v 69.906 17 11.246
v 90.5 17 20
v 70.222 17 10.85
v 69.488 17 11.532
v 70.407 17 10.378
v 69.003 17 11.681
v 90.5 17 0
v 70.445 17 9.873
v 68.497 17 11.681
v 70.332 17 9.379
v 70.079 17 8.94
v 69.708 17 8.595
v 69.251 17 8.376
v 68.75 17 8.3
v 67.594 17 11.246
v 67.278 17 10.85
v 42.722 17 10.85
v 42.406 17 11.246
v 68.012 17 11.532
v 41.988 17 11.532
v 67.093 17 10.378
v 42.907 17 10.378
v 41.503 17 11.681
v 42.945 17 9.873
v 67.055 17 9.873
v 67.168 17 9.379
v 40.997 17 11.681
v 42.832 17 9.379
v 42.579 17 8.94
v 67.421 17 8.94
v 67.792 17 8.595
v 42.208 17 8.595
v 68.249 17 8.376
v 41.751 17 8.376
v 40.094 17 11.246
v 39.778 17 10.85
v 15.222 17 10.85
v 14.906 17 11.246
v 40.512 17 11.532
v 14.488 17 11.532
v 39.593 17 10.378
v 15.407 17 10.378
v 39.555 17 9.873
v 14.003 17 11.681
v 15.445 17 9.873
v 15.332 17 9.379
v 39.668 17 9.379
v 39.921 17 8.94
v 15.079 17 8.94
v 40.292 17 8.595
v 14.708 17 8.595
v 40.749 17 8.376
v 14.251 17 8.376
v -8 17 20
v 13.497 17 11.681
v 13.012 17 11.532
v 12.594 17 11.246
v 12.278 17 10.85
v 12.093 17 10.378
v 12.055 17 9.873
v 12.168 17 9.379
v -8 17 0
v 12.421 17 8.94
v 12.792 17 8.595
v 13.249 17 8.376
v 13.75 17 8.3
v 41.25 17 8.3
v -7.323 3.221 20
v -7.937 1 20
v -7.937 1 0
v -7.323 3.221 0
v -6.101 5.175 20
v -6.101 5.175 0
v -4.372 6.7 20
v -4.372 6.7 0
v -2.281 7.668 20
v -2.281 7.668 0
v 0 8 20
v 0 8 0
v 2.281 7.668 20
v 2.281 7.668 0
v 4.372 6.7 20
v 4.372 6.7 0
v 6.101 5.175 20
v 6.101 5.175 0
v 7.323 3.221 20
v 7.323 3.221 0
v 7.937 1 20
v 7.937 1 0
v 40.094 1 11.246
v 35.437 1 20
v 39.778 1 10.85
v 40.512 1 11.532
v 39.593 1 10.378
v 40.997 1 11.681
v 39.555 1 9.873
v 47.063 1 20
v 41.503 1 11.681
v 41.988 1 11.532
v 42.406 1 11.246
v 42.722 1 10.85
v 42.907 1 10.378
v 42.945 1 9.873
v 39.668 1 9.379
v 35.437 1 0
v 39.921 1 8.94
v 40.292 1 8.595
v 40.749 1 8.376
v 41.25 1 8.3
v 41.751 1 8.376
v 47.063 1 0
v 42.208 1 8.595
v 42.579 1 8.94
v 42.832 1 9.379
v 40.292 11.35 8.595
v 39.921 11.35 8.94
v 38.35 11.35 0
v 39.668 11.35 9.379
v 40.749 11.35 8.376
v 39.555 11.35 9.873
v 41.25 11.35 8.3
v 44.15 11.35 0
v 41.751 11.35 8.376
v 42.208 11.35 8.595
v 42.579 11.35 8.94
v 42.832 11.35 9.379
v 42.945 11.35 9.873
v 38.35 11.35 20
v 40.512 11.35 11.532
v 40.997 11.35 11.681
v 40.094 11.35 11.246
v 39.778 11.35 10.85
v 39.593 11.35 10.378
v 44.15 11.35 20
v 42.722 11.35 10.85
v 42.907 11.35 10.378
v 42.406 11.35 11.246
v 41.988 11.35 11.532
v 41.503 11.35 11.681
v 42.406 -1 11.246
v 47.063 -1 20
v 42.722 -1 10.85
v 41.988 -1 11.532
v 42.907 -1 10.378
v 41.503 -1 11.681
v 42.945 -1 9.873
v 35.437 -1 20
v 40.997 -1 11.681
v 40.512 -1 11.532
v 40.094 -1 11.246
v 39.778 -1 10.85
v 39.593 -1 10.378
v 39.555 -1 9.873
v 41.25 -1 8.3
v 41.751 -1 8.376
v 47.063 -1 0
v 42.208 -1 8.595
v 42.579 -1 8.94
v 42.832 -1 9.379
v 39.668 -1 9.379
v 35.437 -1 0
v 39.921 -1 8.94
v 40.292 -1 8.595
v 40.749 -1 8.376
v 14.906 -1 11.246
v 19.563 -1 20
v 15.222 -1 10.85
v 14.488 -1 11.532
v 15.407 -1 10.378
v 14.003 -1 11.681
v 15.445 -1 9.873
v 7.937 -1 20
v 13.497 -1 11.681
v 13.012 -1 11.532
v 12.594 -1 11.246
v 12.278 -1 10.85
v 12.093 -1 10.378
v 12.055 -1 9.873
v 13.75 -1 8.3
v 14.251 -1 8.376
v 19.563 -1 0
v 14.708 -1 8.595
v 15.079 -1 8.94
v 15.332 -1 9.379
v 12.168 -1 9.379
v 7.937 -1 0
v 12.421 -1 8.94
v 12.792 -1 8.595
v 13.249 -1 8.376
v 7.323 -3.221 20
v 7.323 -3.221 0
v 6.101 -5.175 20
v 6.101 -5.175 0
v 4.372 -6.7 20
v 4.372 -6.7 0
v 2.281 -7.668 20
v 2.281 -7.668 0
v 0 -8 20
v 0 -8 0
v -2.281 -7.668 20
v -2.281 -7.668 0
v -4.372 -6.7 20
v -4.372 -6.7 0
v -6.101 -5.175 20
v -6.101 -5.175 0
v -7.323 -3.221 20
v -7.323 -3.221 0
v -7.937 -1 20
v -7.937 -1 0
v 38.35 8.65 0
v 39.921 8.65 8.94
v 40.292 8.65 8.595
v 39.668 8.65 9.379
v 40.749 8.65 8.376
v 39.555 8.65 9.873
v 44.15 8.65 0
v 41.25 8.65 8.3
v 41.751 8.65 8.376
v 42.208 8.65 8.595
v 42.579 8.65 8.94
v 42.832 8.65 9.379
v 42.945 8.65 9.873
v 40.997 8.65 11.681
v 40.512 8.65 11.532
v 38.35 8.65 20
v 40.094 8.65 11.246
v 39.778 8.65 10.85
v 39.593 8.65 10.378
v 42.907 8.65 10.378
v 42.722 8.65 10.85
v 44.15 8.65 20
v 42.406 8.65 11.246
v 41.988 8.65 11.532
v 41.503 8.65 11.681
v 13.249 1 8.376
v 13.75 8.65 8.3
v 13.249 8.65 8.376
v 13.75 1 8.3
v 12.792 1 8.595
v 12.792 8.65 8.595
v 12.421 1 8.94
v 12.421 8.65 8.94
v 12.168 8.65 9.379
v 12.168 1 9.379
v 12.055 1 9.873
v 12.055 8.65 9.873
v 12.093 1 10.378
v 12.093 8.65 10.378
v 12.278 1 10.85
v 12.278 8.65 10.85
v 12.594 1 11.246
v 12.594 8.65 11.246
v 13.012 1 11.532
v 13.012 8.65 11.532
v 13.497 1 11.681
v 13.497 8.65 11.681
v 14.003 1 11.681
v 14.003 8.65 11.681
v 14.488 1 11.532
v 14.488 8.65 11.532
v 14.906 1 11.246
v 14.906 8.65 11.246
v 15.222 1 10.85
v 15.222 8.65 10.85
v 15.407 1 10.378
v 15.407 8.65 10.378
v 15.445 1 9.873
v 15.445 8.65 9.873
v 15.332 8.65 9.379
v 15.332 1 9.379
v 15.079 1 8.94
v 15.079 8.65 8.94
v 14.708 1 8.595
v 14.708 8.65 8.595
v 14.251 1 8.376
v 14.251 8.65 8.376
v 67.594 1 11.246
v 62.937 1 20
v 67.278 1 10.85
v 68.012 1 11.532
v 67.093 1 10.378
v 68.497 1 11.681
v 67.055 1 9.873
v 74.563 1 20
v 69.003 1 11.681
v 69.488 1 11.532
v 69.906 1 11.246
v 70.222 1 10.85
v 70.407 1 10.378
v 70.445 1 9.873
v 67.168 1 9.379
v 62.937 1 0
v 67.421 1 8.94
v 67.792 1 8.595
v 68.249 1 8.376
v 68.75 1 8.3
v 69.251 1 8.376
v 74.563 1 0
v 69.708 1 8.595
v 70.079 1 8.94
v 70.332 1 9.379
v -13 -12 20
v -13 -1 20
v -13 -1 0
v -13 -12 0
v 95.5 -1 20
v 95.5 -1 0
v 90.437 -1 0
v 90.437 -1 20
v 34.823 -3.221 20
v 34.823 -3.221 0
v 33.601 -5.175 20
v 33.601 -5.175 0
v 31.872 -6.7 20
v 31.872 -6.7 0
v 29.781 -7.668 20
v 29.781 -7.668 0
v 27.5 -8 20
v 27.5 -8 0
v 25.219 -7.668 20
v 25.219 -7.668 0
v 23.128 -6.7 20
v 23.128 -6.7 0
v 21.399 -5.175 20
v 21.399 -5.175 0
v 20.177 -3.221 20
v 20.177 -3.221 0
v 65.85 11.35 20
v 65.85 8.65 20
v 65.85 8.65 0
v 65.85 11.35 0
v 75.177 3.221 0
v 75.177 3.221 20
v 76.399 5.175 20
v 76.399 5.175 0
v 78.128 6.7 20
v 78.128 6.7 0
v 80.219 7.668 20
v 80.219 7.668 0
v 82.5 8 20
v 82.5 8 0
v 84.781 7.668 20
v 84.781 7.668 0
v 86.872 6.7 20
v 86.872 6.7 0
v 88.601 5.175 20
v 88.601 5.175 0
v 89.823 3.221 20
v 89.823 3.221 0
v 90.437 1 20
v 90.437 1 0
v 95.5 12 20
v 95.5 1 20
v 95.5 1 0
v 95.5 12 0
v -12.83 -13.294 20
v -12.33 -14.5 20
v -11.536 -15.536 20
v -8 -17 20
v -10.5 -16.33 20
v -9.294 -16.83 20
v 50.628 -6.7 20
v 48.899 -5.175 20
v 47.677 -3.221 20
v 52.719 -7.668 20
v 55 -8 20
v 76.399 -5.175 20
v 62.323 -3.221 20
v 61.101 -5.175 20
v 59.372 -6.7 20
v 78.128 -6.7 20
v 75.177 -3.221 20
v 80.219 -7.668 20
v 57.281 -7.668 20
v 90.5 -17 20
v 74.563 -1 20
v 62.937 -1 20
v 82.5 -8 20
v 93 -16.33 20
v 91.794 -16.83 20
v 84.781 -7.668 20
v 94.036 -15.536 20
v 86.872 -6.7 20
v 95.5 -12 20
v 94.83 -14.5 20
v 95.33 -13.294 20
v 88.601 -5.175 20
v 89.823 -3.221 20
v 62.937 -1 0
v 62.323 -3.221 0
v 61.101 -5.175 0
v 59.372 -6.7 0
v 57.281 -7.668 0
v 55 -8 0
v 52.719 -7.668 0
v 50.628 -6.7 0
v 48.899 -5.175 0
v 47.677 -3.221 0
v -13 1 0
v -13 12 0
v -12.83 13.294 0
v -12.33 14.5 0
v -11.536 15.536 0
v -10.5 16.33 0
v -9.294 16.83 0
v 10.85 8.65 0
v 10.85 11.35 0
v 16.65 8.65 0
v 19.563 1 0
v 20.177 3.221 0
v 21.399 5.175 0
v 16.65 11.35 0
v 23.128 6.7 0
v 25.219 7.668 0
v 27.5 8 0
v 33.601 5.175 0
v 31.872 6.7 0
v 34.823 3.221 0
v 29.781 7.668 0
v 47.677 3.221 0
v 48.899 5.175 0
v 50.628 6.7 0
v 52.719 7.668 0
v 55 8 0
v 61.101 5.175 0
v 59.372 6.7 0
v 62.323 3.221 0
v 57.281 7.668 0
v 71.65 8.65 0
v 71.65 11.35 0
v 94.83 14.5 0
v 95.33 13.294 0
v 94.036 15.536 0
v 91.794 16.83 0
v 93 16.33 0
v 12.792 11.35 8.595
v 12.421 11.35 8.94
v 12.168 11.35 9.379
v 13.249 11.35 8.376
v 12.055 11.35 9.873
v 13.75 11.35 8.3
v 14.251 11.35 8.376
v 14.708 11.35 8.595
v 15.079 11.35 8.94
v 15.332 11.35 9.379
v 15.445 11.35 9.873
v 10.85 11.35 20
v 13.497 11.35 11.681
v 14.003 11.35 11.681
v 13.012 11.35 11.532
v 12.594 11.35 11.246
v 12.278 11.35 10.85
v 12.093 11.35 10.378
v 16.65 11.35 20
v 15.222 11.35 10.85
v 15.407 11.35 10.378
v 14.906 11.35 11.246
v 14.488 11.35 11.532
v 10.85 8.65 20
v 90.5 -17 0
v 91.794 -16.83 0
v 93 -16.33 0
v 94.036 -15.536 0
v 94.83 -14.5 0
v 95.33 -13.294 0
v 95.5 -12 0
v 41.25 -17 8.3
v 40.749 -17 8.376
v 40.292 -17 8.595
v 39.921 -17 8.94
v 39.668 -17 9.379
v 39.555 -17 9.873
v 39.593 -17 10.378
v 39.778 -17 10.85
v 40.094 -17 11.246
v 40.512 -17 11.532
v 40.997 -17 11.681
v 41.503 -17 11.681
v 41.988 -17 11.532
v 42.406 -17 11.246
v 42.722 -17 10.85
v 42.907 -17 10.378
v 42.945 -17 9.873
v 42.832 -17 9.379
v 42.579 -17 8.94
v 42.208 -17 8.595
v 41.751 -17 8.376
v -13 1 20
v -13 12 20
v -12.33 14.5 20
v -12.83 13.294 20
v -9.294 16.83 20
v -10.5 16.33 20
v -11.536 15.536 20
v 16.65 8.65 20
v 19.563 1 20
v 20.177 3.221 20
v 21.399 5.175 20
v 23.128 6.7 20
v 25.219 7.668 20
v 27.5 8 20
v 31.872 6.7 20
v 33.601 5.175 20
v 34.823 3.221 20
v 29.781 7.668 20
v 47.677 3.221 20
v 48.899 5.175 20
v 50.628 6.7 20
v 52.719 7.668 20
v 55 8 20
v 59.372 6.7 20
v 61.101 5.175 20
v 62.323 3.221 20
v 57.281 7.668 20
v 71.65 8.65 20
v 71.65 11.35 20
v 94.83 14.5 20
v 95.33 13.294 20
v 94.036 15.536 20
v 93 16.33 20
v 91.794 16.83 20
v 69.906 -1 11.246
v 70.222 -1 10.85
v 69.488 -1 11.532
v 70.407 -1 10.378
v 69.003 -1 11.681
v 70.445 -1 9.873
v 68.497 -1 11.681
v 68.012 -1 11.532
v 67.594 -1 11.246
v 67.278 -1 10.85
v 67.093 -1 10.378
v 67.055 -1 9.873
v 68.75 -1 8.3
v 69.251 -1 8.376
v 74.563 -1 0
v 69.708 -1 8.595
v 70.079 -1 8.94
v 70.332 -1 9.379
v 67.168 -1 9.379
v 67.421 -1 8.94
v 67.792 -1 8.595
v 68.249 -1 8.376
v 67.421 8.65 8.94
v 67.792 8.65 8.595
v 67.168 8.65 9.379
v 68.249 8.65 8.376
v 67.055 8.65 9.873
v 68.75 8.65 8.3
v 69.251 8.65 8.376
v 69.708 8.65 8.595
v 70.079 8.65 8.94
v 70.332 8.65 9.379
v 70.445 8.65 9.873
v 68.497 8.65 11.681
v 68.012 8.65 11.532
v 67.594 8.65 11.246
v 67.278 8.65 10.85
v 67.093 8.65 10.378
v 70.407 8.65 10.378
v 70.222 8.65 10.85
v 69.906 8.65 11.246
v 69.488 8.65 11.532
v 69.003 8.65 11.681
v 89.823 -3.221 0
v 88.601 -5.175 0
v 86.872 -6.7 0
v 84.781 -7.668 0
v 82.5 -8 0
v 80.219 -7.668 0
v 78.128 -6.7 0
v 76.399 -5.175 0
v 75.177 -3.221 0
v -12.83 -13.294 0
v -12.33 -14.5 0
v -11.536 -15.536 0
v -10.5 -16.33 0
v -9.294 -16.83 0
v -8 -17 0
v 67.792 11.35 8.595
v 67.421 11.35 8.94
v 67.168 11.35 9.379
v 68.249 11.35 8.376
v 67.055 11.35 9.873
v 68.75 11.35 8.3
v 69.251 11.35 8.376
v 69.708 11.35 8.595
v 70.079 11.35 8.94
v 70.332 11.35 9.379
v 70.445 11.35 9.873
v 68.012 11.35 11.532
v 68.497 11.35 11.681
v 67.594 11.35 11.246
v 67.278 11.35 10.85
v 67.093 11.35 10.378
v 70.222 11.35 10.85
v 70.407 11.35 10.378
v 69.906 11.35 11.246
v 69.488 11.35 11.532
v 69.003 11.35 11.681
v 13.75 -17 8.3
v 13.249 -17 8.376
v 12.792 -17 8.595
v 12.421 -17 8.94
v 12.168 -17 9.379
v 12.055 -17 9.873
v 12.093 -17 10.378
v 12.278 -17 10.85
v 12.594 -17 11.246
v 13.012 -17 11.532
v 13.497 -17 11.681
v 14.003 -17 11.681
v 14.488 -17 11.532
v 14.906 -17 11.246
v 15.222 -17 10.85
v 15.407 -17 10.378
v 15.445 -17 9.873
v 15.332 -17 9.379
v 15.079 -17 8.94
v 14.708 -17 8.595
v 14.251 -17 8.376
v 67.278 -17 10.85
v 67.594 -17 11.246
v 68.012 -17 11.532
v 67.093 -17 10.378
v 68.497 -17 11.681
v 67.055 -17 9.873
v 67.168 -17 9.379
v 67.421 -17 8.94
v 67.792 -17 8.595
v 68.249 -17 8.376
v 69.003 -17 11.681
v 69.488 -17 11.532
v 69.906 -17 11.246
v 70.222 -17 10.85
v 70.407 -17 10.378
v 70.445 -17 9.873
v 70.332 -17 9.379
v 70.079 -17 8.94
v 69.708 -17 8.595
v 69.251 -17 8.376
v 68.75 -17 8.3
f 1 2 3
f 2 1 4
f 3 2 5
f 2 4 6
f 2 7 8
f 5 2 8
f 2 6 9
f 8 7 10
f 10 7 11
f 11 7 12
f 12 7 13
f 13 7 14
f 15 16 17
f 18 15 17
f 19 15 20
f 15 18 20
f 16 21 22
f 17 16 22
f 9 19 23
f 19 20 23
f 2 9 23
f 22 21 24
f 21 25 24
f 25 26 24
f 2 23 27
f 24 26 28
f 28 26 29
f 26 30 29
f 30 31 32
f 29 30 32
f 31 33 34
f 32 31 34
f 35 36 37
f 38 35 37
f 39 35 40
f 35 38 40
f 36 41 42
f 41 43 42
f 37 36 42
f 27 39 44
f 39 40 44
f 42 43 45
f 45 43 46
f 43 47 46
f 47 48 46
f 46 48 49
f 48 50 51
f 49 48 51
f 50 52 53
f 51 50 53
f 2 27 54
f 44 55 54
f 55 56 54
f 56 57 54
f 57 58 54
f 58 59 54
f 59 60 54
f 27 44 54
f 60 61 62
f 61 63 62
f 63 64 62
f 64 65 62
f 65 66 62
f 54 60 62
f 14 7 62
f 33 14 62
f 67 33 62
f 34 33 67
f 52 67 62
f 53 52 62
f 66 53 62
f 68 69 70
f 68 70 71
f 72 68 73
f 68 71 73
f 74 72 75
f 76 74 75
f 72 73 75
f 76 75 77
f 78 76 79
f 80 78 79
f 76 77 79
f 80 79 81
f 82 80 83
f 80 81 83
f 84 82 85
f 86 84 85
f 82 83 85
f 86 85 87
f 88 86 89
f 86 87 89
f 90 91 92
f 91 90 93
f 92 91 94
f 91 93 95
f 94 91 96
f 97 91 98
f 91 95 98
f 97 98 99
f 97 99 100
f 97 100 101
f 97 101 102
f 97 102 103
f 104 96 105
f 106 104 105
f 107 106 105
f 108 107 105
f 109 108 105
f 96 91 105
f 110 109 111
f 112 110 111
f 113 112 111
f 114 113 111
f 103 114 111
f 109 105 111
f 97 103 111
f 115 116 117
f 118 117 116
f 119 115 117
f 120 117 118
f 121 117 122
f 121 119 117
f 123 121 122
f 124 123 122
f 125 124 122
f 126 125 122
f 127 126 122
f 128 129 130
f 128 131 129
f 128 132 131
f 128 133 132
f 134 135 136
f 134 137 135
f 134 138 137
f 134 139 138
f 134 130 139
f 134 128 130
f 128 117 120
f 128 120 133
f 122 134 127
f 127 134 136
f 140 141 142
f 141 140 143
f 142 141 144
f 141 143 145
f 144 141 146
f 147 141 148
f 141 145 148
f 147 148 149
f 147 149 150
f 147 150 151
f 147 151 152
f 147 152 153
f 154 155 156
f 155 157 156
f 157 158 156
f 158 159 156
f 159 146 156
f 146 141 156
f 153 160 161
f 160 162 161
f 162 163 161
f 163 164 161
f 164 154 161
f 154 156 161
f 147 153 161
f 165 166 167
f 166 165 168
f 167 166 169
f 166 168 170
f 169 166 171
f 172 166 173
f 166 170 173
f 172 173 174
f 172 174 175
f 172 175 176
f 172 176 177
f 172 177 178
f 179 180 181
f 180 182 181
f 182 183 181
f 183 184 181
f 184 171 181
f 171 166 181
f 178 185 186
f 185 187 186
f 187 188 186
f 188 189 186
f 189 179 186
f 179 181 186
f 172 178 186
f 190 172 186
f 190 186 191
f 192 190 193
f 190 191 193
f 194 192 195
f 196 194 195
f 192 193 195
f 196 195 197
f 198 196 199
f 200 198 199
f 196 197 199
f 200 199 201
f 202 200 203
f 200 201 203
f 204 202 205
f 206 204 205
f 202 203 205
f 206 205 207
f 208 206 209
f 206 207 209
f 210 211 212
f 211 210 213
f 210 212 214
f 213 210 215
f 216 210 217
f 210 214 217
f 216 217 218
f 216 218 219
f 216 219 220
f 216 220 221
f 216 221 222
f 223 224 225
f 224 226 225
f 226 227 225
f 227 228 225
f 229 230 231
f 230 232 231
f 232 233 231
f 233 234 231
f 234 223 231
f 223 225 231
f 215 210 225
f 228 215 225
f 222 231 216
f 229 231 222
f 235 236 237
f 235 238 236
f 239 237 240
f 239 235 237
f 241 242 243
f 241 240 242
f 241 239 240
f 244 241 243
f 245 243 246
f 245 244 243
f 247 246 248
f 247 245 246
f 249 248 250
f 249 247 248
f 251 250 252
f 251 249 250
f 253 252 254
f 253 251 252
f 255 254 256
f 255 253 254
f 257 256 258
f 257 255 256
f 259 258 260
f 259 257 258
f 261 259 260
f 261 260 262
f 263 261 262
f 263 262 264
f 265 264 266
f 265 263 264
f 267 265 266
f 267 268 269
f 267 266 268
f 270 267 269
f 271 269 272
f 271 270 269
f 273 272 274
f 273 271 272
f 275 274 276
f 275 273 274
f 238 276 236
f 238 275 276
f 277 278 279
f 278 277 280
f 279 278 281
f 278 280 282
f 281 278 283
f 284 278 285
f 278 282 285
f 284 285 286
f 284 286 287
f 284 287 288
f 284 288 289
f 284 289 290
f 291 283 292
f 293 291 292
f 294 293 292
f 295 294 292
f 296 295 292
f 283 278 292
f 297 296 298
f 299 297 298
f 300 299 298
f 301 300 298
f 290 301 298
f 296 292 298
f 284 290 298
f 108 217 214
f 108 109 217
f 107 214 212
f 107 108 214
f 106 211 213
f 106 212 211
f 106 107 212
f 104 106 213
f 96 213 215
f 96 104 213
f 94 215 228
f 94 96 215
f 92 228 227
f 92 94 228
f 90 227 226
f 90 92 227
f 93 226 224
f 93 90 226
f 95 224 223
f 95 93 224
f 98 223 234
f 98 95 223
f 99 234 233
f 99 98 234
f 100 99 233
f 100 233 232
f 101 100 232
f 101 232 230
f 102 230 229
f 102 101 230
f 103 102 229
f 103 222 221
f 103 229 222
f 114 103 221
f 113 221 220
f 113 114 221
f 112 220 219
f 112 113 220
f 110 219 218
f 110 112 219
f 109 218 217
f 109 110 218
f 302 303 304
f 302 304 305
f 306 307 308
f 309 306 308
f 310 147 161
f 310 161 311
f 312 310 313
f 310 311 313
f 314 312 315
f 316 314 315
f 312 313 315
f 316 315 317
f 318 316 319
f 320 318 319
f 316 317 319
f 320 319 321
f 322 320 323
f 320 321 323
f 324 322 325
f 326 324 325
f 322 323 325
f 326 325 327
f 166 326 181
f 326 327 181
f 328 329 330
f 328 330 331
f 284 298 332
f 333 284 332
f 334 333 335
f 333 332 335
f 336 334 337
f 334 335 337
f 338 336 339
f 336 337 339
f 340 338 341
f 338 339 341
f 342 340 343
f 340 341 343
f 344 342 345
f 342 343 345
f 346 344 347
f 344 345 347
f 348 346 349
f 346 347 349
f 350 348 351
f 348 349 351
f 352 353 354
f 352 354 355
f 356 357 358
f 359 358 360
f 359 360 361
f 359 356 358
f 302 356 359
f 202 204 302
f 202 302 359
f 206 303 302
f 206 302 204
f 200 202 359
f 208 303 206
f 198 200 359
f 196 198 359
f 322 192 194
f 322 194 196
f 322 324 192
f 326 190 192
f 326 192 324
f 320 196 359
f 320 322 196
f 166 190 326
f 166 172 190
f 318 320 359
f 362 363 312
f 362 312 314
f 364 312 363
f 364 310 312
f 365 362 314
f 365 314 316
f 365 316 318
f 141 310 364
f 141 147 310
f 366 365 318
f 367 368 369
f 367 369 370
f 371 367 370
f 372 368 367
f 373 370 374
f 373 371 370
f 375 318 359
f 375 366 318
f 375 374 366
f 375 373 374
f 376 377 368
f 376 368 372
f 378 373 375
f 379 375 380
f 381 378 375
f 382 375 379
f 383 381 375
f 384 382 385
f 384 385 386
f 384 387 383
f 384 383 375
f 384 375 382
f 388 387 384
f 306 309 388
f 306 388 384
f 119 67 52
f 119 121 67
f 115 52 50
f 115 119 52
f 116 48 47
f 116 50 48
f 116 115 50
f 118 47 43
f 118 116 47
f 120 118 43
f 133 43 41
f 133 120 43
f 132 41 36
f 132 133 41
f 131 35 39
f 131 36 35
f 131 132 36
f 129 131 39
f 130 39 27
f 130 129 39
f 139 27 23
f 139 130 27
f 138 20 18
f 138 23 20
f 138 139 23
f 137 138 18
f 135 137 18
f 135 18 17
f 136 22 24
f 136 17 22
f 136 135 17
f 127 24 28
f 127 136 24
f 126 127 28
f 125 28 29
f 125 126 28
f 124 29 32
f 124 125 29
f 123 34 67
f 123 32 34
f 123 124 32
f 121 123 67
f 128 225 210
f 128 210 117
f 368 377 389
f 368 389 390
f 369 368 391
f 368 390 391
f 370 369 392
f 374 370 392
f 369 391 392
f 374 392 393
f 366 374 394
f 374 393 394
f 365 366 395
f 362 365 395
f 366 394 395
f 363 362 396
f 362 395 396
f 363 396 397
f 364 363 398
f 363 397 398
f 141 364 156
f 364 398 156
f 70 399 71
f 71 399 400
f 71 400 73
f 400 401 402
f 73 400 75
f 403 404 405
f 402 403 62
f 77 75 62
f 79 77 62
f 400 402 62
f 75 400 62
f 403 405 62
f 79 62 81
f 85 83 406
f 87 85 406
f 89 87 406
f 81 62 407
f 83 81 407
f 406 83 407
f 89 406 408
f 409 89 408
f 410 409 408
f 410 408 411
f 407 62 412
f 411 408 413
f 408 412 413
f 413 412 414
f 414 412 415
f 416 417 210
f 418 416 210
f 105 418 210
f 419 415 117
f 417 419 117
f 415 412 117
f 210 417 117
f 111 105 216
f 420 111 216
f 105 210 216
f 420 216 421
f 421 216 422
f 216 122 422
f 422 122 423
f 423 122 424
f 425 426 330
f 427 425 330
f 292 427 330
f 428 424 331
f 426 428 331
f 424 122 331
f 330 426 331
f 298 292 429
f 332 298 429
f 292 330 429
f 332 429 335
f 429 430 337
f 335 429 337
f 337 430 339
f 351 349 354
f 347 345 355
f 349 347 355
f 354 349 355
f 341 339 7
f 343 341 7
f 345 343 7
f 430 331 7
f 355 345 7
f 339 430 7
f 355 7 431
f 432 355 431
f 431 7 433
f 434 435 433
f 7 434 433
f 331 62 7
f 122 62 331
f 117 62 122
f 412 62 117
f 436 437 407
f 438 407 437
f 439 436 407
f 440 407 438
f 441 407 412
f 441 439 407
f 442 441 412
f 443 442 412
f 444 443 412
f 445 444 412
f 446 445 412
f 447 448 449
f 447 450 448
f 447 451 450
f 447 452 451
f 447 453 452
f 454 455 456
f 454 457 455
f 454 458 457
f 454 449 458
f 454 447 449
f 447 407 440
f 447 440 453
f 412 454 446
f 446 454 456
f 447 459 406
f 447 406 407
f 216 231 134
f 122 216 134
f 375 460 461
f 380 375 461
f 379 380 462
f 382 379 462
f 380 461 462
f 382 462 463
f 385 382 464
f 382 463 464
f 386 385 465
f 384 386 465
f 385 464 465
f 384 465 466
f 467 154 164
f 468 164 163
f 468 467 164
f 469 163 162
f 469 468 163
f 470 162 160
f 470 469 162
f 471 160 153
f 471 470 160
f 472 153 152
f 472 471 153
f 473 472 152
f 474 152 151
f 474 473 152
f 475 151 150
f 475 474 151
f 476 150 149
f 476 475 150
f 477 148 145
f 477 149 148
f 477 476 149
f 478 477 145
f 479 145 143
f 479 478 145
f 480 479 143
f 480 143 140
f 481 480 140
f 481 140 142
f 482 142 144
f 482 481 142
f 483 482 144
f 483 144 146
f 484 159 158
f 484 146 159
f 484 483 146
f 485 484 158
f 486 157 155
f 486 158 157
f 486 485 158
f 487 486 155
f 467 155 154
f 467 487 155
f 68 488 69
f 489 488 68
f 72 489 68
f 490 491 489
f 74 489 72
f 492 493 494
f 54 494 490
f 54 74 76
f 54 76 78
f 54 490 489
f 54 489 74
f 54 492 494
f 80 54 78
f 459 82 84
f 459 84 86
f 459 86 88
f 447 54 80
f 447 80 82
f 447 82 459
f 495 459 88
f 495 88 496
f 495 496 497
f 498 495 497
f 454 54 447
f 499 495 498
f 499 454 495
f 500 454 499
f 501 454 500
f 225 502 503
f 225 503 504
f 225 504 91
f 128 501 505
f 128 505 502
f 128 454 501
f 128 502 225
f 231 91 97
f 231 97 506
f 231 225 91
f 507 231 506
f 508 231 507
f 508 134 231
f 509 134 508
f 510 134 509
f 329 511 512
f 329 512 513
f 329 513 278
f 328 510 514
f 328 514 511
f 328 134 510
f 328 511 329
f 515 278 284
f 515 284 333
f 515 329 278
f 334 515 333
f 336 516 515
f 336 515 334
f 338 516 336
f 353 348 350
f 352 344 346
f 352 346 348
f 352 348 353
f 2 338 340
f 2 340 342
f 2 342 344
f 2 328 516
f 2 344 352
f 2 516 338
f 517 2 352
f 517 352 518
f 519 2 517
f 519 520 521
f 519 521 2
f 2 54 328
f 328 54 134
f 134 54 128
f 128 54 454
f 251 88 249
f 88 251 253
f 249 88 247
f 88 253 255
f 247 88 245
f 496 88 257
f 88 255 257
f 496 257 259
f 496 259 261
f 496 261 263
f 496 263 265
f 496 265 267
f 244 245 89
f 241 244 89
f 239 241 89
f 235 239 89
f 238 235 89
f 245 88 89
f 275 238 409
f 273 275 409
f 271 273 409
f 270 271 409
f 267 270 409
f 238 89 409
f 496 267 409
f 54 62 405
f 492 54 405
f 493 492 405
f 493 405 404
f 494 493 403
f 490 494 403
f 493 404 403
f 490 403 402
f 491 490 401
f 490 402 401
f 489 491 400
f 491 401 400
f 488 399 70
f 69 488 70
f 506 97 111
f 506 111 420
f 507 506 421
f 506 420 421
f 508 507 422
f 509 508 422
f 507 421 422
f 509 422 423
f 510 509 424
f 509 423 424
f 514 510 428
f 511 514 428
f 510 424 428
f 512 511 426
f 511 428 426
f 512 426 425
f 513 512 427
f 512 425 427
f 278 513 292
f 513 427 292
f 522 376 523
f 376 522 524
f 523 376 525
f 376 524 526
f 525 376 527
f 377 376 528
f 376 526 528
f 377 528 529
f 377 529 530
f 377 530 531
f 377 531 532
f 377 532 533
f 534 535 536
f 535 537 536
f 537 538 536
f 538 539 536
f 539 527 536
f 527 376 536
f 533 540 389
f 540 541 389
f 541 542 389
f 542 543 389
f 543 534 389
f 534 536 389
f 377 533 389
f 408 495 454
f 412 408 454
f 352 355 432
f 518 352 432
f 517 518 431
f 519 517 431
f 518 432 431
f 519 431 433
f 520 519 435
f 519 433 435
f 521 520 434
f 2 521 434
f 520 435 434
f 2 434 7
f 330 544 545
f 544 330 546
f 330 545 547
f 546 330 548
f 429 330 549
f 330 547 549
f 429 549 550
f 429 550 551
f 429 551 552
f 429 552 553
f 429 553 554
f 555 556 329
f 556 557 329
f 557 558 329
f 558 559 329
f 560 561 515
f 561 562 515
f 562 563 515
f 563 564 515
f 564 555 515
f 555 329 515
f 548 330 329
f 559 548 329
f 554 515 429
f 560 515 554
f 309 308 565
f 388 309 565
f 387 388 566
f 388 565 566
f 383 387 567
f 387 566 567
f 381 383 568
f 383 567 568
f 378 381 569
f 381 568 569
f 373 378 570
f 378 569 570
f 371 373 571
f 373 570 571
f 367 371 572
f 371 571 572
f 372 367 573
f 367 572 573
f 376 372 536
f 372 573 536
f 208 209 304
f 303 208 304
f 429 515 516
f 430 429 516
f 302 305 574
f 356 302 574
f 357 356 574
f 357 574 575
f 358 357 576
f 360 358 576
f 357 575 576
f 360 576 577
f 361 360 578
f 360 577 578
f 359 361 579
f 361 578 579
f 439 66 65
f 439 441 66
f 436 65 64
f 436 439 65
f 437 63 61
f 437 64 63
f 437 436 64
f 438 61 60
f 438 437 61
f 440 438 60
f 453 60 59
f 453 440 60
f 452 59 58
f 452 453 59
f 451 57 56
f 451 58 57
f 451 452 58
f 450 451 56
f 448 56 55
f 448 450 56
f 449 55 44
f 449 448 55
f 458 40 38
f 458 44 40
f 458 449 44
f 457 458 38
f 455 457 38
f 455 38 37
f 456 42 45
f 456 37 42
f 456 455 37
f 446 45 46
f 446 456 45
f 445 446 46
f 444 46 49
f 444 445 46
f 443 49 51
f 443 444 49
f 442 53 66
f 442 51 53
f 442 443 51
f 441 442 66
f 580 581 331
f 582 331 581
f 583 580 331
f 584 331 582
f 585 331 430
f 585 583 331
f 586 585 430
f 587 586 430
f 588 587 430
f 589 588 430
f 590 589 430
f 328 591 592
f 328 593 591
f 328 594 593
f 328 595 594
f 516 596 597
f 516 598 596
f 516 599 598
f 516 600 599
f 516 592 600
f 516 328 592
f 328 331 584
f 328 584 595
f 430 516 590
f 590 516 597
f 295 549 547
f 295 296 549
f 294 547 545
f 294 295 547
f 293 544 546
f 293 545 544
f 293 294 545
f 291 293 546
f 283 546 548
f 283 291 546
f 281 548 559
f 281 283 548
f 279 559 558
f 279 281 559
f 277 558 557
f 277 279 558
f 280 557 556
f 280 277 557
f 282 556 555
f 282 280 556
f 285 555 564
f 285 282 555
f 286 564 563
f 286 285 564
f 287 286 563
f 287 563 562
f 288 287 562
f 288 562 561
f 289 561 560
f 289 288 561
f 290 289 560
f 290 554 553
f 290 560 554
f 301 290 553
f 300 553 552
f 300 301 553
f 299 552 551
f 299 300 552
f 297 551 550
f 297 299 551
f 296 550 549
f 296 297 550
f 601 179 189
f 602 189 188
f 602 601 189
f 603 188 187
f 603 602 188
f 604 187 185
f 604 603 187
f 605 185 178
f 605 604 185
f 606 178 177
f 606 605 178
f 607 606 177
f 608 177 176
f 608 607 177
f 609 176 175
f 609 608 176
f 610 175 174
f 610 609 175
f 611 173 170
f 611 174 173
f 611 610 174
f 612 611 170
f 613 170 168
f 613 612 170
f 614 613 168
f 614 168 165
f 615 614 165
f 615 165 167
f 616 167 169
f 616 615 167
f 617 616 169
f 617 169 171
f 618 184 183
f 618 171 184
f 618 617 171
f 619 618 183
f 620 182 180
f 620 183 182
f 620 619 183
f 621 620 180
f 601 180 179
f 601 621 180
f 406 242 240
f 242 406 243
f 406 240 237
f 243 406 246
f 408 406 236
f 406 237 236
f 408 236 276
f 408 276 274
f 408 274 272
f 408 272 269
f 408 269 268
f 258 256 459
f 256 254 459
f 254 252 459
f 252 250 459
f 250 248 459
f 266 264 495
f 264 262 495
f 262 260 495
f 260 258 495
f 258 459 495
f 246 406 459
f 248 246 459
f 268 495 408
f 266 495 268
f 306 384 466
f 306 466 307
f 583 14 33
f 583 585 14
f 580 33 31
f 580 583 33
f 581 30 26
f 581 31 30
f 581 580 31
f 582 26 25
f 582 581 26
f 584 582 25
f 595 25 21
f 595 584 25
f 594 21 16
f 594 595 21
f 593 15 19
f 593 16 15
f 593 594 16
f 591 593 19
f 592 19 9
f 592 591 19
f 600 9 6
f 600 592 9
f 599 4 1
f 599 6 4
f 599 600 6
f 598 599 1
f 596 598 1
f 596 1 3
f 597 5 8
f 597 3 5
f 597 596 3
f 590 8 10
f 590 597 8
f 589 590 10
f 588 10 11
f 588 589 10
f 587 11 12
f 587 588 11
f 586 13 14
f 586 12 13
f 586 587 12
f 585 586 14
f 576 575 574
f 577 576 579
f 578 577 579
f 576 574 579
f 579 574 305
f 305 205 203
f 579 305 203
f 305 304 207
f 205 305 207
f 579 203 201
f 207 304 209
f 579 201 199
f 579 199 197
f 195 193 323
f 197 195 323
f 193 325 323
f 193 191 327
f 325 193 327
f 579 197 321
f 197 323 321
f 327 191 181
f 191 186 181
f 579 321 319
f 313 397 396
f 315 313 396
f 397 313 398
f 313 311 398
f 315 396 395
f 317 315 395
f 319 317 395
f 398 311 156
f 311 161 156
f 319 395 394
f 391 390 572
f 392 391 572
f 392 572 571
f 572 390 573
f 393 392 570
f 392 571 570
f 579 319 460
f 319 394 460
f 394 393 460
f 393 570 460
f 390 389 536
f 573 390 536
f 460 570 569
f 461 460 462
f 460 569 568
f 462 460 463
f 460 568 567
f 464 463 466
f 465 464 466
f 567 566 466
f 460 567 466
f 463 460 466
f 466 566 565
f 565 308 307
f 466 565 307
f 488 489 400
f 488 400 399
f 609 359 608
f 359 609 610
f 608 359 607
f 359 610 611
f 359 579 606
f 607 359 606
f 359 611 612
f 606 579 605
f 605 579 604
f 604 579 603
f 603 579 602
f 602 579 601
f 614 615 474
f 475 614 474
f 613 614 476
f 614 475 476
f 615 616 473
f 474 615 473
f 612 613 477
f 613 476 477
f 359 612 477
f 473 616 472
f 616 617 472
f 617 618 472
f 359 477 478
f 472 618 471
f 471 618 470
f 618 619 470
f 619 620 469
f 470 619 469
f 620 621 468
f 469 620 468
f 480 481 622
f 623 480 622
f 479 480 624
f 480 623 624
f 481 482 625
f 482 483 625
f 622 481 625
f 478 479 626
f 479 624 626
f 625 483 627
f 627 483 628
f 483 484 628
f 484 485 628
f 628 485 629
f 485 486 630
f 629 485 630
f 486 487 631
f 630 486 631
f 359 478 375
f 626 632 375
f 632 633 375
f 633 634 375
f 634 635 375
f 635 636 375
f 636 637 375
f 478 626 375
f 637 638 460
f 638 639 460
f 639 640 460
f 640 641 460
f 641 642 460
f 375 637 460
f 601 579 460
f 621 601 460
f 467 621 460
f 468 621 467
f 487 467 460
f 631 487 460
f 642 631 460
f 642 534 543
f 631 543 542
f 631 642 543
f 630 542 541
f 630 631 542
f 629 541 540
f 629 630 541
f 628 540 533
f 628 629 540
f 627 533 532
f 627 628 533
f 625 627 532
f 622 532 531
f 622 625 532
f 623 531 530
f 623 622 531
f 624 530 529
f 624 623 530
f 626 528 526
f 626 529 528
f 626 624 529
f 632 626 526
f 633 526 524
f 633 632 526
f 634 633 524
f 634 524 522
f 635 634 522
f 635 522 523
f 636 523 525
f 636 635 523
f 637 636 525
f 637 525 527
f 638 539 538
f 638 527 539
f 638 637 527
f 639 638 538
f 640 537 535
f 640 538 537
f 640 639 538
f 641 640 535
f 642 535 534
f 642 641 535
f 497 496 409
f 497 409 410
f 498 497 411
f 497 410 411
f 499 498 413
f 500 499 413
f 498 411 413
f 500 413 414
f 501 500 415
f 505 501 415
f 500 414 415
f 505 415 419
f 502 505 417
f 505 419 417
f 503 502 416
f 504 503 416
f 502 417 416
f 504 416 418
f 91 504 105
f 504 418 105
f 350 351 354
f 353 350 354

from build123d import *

# Parameters (mm, degrees)
ESTRUSIONE_ESTRUSIONE1_DEPTH   = 20
ESTRUSIONE_ESTRUSIONE1_2_DEPTH = 20
SCHIZZO2_W                     = 5.8
SCHIZZO2_H                     = 2.7
TAGLIO_ESTRUSIONE1_DEPTH       = 20
FORO_PER_VITE_M3_1_AT_2_COUNT  = 2
FORO_PER_VITE_M3_1_AT_2_PITCH  = 27.5
FORO_PER_VITE_M3_1_AT_3_COUNT  = 2
FORO_PER_VITE_M3_1_AT_3_PITCH  = 55


with BuildPart() as part:
    # Schizzo1 → Estrusione-Estrusione1 (new body)
    with BuildSketch(Plane.XY):
        with BuildLine():
            Line((90.5, 17), (-8, 17))
            ThreePointArc((-8, 17), (-11.535533906, 15.535533906), (-13, 12))
            Line((-13, 12), (-13, 1))
            Line((-13, 1), (-7.937253933, 1))
            ThreePointArc((-7.937253933, 1), (0, 8), (7.937253933, 1))
            Line((7.937253933, 1), (19.562746067, 1))
            ThreePointArc((19.562746067, 1), (27.5, 8), (35.437253933, 1))
            Line((35.437253933, 1), (47.062746067, 1))
            ThreePointArc((47.062746067, 1), (55, 8), (62.937253933, 1))
            Line((62.937253933, 1), (74.562746067, 1))
            ThreePointArc((74.562746067, 1), (82.5, 8), (90.437253933, 1))
            Line((90.437253933, 1), (95.5, 1))
            Line((95.5, 1), (95.5, 12))
            ThreePointArc((95.5, 12), (94.035533906, 15.535533906), (90.5, 17))
        make_face()
    extrude(amount=ESTRUSIONE_ESTRUSIONE1_DEPTH)

    # Schizzo2 → Taglio-Estrusione1 (cut)
    with BuildSketch(Plane.XY.offset(20)):
        with Locations((13.75, 10)):
            Rectangle(SCHIZZO2_W, SCHIZZO2_H)
        with Locations((41.25, 10)):
            Rectangle(SCHIZZO2_W, SCHIZZO2_H)
        with Locations((68.75, 10)):
            Rectangle(SCHIZZO2_W, SCHIZZO2_H)
    extrude(amount=-TAGLIO_ESTRUSIONE1_DEPTH, mode=Mode.SUBTRACT)


with BuildPart() as body_2:
    # Schizzo1 → Estrusione-Estrusione1 2 (new body)
    with BuildSketch(Plane.XY):
        with BuildLine():
            Line((-7.937253933, -1), (-13, -1))
            Line((-13, -1), (-13, -12))
            ThreePointArc((-13, -12), (-11.535533906, -15.535533906), (-8, -17))
            Line((-8, -17), (90.5, -17))
            ThreePointArc((90.5, -17), (94.035533906, -15.535533906), (95.5, -12))
            Line((95.5, -12), (95.5, -1))
            Line((95.5, -1), (90.437253933, -1))
            ThreePointArc((90.437253933, -1), (82.5, -8), (74.562746067, -1))
            Line((74.562746067, -1), (62.937253933, -1))
            ThreePointArc((62.937253933, -1), (55, -8), (47.062746067, -1))
            Line((47.062746067, -1), (35.437253933, -1))
            ThreePointArc((35.437253933, -1), (27.5, -8), (19.562746067, -1))
            Line((19.562746067, -1), (7.937253933, -1))
            ThreePointArc((7.937253933, -1), (0, -8), (-7.937253933, -1))
        make_face()
    extrude(amount=ESTRUSIONE_ESTRUSIONE1_2_DEPTH)


with BuildPart() as foro_per_vite_m3_1_tool:
    # Schizzo5 → Foro per Vite M3-1 (revolve)
    with BuildSketch(Plane(origin=(68.75, -17, 10), x_dir=(0, 0, -1), z_dir=(1, 0, 0))):
        Polygon((0, 0), (0, 40), (1.7, 38.978536948), (1.7, 0), align=None)
    foro_per_vite_m3_1 = revolve(axis=Axis((68.75, -23.35, 10), (0, 1, 0)))


with BuildPart() as part_1:
    add(part.part)

    # Foro per Vite M3-1: cut by foro_per_vite_m3_1_tool
    add(foro_per_vite_m3_1_tool.part, mode=Mode.SUBTRACT)


with BuildPart() as body_2_1:
    add(body_2.part)

    # Foro per Vite M3-1: cut by foro_per_vite_m3_1_tool
    add(foro_per_vite_m3_1_tool.part, mode=Mode.SUBTRACT)


with BuildPart() as foro_per_vite_m3_1_at_2_tool:
    # Foro per Vite M3-1 at 2: Foro per Vite M3-1 ×2
    with Locations(*[(-i * FORO_PER_VITE_M3_1_AT_2_PITCH, 0, 0) for i in range(1, FORO_PER_VITE_M3_1_AT_2_COUNT)]):
        add(foro_per_vite_m3_1)


with BuildPart() as part_2:
    add(part_1.part)

    # Foro per Vite M3-1 at 2: cut by foro_per_vite_m3_1_at_2_tool
    add(foro_per_vite_m3_1_at_2_tool.part, mode=Mode.SUBTRACT)


with BuildPart() as body_2_2:
    add(body_2_1.part)

    # Foro per Vite M3-1 at 2: cut by foro_per_vite_m3_1_at_2_tool
    add(foro_per_vite_m3_1_at_2_tool.part, mode=Mode.SUBTRACT)


with BuildPart() as foro_per_vite_m3_1_at_3_tool:
    # Foro per Vite M3-1 at 3: Foro per Vite M3-1 ×2
    with Locations(*[(-i * FORO_PER_VITE_M3_1_AT_3_PITCH, 0, 0) for i in range(1, FORO_PER_VITE_M3_1_AT_3_COUNT)]):
        add(foro_per_vite_m3_1)


with BuildPart() as part_3:
    add(part_2.part)

    # Foro per Vite M3-1 at 3: cut by foro_per_vite_m3_1_at_3_tool
    add(foro_per_vite_m3_1_at_3_tool.part, mode=Mode.SUBTRACT)


with BuildPart() as body_2_3:
    add(body_2_2.part)

    # Foro per Vite M3-1 at 3: cut by foro_per_vite_m3_1_at_3_tool
    add(foro_per_vite_m3_1_at_3_tool.part, mode=Mode.SUBTRACT)


solid = Compound([part_3.part, body_2_3.part])
